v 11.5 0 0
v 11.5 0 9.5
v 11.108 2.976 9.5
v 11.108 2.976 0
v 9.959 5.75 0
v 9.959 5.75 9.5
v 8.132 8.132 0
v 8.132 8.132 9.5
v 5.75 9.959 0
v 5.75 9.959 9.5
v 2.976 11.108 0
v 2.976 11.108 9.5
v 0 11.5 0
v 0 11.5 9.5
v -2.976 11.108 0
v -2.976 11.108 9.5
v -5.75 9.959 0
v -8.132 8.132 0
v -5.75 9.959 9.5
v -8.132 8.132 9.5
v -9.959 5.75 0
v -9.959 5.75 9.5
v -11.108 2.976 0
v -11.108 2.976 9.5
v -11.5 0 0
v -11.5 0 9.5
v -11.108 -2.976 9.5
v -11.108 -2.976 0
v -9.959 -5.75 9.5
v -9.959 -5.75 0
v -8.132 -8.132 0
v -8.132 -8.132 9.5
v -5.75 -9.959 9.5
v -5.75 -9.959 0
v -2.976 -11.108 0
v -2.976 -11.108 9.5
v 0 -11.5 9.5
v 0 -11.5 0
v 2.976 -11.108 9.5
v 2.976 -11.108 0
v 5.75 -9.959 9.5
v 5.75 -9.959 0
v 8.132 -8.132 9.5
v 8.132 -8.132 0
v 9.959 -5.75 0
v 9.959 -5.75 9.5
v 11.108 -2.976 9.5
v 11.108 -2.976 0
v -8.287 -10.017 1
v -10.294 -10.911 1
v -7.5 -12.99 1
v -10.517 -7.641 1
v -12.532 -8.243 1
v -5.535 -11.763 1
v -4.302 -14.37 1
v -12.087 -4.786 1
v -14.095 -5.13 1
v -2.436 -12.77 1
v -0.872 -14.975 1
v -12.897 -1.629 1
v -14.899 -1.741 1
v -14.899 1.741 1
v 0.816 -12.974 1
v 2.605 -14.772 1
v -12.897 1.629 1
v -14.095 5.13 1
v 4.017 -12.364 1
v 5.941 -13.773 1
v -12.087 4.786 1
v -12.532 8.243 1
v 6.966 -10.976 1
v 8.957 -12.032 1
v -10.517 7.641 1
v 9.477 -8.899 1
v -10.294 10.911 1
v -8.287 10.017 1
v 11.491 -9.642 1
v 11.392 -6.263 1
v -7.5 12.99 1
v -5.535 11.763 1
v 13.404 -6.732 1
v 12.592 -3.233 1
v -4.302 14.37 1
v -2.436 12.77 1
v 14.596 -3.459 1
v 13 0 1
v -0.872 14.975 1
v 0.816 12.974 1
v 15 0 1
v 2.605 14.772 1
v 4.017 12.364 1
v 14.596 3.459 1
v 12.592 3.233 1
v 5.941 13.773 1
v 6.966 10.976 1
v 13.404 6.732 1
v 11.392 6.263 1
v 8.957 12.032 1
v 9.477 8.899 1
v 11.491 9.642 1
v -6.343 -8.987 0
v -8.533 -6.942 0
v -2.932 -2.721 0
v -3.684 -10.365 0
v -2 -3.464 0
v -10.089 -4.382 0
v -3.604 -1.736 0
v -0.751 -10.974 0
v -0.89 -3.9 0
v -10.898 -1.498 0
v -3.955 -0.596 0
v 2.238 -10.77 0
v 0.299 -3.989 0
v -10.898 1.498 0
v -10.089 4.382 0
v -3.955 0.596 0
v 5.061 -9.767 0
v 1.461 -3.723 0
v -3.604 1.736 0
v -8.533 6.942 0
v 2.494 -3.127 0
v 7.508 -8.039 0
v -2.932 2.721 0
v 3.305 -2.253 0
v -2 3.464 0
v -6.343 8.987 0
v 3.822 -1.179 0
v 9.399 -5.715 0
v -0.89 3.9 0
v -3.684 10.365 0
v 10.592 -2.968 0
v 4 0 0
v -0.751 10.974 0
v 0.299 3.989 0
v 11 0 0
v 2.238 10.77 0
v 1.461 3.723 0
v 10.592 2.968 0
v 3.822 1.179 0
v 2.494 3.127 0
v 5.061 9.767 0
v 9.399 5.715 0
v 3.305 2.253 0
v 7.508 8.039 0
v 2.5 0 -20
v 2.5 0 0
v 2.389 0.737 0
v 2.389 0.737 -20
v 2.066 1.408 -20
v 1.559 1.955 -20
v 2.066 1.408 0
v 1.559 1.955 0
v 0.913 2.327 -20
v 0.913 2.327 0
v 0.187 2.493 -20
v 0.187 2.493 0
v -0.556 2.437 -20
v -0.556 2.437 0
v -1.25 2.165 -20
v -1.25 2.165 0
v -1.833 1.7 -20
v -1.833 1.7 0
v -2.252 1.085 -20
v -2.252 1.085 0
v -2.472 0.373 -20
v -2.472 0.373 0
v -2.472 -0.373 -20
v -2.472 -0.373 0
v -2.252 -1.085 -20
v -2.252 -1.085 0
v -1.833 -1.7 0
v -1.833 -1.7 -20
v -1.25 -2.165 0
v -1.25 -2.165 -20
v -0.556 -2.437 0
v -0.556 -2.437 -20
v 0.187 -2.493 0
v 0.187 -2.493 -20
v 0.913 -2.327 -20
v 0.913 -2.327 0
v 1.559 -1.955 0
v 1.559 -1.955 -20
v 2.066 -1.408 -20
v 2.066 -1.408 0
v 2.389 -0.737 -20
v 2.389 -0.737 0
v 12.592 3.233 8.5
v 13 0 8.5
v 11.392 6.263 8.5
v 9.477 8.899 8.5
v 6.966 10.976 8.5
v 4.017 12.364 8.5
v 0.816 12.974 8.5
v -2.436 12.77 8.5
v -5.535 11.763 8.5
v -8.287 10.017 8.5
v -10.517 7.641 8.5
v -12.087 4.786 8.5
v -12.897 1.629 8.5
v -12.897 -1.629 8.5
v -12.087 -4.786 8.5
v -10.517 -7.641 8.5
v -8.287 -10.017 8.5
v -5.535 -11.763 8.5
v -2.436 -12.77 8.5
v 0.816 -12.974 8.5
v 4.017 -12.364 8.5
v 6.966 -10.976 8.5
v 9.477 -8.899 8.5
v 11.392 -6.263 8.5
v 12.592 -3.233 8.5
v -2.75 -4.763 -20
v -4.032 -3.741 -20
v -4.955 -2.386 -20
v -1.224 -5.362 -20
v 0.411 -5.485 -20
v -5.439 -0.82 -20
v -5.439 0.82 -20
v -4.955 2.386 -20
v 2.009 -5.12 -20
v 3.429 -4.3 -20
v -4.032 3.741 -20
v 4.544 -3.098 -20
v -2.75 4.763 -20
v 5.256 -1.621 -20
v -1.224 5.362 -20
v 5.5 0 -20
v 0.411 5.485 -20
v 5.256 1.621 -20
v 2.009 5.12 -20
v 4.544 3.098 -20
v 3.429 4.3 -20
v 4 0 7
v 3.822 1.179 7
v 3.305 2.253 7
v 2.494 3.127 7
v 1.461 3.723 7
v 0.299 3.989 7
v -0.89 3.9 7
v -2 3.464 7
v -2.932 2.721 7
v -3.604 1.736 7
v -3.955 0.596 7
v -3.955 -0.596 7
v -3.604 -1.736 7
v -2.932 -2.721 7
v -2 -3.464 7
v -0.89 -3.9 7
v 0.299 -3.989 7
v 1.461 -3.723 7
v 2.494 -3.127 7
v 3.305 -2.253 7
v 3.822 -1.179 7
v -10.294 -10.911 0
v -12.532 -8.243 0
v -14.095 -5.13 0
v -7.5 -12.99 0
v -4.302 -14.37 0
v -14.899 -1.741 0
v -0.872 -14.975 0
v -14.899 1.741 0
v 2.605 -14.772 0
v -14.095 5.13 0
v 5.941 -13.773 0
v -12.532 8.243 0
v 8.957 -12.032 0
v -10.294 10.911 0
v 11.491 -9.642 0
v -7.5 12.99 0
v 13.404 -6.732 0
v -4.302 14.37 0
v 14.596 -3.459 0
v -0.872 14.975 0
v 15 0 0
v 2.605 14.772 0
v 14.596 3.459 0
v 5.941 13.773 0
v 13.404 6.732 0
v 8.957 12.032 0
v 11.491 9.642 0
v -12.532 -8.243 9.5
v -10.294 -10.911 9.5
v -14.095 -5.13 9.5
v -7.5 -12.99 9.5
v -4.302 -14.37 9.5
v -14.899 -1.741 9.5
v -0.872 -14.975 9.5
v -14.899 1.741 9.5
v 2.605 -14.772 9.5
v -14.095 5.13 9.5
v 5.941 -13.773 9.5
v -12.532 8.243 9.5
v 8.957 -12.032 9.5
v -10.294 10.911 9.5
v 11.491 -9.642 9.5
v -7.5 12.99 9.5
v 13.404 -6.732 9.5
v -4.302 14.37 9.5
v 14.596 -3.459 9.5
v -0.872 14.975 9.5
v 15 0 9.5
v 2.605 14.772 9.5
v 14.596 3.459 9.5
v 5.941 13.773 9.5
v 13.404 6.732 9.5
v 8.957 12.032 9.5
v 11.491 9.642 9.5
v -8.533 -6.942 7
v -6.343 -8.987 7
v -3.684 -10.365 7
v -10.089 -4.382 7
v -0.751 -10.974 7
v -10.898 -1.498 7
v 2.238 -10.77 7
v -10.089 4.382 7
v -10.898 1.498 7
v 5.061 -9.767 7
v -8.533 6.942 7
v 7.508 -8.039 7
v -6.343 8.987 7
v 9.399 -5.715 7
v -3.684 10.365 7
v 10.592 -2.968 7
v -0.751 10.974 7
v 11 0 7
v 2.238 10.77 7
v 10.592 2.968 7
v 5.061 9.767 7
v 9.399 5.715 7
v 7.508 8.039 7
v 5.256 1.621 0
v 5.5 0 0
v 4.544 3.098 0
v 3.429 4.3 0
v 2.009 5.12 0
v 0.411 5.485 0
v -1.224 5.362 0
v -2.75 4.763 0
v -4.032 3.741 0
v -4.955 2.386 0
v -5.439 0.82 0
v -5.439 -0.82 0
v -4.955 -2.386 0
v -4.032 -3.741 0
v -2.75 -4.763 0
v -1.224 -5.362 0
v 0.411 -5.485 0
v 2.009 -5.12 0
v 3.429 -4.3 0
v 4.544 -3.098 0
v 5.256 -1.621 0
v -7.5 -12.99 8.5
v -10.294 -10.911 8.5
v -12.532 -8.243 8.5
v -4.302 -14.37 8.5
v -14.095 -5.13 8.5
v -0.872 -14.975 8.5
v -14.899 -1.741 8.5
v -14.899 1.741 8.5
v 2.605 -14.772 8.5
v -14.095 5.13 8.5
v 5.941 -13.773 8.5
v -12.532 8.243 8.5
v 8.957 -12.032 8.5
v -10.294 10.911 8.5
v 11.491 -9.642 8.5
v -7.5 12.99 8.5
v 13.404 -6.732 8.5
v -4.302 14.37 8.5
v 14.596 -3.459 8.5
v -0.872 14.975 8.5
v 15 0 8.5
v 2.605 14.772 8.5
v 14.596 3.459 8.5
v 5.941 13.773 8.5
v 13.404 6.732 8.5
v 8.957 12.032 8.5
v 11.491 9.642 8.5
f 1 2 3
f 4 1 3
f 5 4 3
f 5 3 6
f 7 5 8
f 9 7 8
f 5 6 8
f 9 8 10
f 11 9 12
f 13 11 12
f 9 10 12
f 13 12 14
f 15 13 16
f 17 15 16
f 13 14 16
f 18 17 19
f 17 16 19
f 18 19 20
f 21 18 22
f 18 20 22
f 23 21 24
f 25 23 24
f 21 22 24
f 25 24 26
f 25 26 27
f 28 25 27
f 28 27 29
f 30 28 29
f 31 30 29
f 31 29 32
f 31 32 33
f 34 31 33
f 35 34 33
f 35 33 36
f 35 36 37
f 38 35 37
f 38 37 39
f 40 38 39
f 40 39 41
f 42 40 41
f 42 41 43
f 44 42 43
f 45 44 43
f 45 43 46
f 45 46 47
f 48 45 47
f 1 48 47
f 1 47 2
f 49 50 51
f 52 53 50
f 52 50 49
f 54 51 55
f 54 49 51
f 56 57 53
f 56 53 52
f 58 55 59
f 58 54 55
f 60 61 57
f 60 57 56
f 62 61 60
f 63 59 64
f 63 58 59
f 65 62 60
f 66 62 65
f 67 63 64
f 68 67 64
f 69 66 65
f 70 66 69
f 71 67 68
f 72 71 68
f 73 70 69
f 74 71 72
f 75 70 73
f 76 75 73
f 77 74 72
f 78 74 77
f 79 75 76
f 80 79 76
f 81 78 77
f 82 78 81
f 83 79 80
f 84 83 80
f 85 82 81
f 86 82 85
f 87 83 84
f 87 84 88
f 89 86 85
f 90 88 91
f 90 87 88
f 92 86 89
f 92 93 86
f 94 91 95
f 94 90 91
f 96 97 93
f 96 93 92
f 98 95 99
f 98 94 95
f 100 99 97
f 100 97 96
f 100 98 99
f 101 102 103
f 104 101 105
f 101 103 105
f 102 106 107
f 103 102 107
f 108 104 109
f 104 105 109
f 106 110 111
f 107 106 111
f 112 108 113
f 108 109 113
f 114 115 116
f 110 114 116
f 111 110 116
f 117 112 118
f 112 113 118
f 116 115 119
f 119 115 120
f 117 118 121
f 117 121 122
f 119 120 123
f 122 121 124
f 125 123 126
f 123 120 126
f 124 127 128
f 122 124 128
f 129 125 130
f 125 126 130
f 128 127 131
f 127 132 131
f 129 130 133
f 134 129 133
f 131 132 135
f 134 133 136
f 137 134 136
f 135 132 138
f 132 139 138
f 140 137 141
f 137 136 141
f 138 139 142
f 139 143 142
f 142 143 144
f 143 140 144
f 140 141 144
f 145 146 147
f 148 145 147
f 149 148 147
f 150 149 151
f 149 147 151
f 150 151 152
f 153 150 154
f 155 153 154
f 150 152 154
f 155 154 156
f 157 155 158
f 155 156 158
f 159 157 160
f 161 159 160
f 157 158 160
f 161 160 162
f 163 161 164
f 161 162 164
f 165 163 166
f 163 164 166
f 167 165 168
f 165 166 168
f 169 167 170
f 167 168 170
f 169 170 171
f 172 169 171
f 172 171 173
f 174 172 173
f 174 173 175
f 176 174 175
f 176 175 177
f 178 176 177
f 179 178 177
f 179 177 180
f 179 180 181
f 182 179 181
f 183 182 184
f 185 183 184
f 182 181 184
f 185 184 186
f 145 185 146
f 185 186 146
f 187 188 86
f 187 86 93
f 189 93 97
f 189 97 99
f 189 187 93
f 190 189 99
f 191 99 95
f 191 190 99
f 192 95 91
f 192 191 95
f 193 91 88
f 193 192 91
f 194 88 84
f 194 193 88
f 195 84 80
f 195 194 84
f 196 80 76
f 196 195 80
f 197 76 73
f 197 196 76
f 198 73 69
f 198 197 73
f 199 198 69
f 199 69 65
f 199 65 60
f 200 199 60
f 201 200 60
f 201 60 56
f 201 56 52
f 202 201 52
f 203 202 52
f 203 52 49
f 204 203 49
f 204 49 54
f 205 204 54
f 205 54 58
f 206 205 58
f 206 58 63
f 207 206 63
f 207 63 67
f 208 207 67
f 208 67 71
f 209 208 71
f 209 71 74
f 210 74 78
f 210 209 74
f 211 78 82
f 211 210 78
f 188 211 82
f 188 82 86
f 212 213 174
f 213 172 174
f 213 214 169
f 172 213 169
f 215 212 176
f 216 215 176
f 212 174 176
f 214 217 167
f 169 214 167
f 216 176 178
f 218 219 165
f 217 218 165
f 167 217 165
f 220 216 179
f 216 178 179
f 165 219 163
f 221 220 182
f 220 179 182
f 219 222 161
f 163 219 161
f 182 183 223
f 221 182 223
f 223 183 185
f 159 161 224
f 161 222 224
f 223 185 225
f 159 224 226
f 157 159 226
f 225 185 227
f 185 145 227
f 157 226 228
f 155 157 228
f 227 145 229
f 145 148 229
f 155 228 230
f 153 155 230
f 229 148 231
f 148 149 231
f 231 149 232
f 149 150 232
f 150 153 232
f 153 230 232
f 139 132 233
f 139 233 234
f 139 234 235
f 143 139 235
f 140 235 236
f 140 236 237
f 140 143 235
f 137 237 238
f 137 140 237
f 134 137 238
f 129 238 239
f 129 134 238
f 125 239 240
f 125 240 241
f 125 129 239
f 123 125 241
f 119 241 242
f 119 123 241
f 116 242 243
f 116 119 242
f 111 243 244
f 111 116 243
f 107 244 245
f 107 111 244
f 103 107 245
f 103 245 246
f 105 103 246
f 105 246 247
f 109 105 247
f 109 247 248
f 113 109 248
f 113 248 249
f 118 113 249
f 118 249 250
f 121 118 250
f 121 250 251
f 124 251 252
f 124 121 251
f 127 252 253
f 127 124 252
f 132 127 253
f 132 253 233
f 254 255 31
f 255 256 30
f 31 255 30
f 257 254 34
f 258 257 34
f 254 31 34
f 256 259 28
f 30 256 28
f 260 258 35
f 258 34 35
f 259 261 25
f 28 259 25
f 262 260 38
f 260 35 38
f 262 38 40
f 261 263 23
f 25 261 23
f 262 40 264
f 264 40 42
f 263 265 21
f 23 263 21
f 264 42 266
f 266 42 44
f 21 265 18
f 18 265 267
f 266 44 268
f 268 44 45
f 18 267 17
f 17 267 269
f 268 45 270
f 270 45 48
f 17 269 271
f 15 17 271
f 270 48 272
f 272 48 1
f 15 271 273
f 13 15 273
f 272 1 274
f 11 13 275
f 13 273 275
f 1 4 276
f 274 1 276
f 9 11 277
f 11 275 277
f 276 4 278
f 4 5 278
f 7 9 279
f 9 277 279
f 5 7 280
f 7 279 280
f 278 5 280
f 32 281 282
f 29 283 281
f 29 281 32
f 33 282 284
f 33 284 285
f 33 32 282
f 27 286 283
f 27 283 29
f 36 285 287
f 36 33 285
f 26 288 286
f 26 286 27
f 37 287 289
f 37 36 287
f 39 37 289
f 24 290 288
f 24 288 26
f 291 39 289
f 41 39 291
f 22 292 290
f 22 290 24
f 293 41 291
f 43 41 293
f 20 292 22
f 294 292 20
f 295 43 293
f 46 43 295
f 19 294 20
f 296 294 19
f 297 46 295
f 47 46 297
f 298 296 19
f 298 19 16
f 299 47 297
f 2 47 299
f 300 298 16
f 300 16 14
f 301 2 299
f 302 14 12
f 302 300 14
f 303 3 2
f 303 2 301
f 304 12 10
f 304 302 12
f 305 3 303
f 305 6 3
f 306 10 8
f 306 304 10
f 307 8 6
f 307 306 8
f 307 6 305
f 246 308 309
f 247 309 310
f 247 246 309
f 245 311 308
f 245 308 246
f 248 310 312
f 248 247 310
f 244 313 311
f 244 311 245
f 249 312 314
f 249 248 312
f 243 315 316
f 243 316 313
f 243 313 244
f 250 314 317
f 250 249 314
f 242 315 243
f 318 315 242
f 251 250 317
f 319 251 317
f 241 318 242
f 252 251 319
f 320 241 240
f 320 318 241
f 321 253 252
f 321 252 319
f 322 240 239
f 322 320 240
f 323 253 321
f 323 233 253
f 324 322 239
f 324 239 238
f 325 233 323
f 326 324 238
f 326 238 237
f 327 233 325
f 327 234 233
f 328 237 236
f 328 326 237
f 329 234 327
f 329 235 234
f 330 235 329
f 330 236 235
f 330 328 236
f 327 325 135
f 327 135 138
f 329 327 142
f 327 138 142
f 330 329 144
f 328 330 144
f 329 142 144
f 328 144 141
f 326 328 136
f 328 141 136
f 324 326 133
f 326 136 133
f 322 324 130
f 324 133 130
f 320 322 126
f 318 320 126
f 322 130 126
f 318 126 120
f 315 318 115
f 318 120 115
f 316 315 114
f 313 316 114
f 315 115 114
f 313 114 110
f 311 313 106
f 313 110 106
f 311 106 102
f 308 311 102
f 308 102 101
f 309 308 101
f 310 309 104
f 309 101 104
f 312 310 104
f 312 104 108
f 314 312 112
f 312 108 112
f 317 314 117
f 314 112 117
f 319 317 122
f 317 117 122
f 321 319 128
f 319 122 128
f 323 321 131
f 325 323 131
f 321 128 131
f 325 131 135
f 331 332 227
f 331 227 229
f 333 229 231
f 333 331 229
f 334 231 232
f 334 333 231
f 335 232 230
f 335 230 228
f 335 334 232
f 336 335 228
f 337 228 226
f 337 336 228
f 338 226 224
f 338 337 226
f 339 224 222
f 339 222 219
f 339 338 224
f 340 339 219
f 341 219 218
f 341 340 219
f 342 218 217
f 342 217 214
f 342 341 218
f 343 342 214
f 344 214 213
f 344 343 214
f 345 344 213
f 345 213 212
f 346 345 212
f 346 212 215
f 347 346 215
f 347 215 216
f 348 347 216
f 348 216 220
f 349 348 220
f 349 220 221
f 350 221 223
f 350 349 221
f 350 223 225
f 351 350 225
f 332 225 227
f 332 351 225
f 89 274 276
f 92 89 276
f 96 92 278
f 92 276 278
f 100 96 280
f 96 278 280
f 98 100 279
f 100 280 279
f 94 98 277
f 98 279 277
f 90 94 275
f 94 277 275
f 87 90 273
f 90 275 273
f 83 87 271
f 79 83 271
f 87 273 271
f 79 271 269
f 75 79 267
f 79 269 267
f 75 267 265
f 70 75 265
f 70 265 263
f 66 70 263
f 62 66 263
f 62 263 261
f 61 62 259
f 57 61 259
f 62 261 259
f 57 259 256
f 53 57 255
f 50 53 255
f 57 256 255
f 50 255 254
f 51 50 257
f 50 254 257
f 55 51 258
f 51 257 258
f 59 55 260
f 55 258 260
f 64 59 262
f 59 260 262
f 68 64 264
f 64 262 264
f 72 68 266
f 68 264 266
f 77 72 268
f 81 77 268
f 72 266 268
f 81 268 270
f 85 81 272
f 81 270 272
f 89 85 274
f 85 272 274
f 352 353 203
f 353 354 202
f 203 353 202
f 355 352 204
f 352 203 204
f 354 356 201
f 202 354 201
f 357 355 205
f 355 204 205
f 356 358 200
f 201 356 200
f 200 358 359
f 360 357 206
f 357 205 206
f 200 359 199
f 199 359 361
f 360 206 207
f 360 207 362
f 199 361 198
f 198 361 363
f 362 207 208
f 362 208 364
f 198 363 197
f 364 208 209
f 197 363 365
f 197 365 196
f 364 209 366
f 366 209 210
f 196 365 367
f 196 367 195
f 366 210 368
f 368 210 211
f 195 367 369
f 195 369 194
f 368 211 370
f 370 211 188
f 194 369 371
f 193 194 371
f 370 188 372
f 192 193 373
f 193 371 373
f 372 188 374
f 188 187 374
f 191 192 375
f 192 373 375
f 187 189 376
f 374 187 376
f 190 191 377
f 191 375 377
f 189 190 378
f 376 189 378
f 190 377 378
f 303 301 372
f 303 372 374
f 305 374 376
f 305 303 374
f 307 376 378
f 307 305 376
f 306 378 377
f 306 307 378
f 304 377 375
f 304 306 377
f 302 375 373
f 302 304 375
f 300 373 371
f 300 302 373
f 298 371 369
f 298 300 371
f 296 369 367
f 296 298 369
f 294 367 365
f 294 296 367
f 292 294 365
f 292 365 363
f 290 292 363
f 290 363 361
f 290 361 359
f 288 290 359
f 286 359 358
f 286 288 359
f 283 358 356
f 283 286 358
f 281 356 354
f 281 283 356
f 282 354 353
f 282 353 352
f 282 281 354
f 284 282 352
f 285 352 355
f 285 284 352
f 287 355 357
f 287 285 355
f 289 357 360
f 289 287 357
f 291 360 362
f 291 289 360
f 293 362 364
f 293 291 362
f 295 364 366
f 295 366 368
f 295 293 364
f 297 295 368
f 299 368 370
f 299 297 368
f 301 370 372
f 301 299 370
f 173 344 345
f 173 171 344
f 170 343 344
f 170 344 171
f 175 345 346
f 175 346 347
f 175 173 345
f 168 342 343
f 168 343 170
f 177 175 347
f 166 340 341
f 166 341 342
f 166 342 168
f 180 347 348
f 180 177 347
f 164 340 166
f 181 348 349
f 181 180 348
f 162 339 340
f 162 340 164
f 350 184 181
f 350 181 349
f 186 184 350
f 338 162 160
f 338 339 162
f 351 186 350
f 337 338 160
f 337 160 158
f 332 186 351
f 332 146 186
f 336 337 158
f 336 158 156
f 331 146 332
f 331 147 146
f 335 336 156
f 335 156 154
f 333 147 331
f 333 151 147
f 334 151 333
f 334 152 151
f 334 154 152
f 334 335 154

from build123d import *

# Parameters (mm, degrees)
F0_R     = 11
F0_R_2   = 4
F1_DEPTH = 7
F2_R     = 5.5
F2_R_2   = 2.5
F3_DEPTH = 20
F4_R     = 13
F4_R_2   = 11.5
F5_DEPTH = 4.75
F6_R     = 15
F6_R_2   = 13
F7_DEPTH = 1


with BuildPart() as f1:
    # F0 (on Top) → F1 (new body)
    with BuildSketch(Plane.XY):
        Circle(F0_R)
        Circle(F0_R_2, mode=Mode.SUBTRACT)
    extrude(amount=F1_DEPTH)


with BuildPart() as f3:
    # F2 (on Top) → F3 (new body)
    with BuildSketch(Plane.XY):
        Circle(F2_R)
        Circle(F2_R_2, mode=Mode.SUBTRACT)
    extrude(amount=-F3_DEPTH)


with BuildPart() as f5:
    # F4 (on Top) → F5 (new body)
    with BuildSketch(Plane.XY):
        Circle(F4_R)
        Circle(F4_R_2, mode=Mode.SUBTRACT)
    extrude(amount=F5_DEPTH)

    # F6 (on Top) → F7 (join)
    with BuildSketch(Plane.XY):
        Circle(F6_R)
        Circle(F6_R_2, mode=Mode.SUBTRACT)
    extrude(amount=F7_DEPTH)

    # F8: F5 across face


with BuildPart() as f5_1:
    add(f5.part)
    add(f5.part.mirror(Plane.XY.offset(4.75)))


solid = Compound([f1.part, f3.part, f5_1.part])
